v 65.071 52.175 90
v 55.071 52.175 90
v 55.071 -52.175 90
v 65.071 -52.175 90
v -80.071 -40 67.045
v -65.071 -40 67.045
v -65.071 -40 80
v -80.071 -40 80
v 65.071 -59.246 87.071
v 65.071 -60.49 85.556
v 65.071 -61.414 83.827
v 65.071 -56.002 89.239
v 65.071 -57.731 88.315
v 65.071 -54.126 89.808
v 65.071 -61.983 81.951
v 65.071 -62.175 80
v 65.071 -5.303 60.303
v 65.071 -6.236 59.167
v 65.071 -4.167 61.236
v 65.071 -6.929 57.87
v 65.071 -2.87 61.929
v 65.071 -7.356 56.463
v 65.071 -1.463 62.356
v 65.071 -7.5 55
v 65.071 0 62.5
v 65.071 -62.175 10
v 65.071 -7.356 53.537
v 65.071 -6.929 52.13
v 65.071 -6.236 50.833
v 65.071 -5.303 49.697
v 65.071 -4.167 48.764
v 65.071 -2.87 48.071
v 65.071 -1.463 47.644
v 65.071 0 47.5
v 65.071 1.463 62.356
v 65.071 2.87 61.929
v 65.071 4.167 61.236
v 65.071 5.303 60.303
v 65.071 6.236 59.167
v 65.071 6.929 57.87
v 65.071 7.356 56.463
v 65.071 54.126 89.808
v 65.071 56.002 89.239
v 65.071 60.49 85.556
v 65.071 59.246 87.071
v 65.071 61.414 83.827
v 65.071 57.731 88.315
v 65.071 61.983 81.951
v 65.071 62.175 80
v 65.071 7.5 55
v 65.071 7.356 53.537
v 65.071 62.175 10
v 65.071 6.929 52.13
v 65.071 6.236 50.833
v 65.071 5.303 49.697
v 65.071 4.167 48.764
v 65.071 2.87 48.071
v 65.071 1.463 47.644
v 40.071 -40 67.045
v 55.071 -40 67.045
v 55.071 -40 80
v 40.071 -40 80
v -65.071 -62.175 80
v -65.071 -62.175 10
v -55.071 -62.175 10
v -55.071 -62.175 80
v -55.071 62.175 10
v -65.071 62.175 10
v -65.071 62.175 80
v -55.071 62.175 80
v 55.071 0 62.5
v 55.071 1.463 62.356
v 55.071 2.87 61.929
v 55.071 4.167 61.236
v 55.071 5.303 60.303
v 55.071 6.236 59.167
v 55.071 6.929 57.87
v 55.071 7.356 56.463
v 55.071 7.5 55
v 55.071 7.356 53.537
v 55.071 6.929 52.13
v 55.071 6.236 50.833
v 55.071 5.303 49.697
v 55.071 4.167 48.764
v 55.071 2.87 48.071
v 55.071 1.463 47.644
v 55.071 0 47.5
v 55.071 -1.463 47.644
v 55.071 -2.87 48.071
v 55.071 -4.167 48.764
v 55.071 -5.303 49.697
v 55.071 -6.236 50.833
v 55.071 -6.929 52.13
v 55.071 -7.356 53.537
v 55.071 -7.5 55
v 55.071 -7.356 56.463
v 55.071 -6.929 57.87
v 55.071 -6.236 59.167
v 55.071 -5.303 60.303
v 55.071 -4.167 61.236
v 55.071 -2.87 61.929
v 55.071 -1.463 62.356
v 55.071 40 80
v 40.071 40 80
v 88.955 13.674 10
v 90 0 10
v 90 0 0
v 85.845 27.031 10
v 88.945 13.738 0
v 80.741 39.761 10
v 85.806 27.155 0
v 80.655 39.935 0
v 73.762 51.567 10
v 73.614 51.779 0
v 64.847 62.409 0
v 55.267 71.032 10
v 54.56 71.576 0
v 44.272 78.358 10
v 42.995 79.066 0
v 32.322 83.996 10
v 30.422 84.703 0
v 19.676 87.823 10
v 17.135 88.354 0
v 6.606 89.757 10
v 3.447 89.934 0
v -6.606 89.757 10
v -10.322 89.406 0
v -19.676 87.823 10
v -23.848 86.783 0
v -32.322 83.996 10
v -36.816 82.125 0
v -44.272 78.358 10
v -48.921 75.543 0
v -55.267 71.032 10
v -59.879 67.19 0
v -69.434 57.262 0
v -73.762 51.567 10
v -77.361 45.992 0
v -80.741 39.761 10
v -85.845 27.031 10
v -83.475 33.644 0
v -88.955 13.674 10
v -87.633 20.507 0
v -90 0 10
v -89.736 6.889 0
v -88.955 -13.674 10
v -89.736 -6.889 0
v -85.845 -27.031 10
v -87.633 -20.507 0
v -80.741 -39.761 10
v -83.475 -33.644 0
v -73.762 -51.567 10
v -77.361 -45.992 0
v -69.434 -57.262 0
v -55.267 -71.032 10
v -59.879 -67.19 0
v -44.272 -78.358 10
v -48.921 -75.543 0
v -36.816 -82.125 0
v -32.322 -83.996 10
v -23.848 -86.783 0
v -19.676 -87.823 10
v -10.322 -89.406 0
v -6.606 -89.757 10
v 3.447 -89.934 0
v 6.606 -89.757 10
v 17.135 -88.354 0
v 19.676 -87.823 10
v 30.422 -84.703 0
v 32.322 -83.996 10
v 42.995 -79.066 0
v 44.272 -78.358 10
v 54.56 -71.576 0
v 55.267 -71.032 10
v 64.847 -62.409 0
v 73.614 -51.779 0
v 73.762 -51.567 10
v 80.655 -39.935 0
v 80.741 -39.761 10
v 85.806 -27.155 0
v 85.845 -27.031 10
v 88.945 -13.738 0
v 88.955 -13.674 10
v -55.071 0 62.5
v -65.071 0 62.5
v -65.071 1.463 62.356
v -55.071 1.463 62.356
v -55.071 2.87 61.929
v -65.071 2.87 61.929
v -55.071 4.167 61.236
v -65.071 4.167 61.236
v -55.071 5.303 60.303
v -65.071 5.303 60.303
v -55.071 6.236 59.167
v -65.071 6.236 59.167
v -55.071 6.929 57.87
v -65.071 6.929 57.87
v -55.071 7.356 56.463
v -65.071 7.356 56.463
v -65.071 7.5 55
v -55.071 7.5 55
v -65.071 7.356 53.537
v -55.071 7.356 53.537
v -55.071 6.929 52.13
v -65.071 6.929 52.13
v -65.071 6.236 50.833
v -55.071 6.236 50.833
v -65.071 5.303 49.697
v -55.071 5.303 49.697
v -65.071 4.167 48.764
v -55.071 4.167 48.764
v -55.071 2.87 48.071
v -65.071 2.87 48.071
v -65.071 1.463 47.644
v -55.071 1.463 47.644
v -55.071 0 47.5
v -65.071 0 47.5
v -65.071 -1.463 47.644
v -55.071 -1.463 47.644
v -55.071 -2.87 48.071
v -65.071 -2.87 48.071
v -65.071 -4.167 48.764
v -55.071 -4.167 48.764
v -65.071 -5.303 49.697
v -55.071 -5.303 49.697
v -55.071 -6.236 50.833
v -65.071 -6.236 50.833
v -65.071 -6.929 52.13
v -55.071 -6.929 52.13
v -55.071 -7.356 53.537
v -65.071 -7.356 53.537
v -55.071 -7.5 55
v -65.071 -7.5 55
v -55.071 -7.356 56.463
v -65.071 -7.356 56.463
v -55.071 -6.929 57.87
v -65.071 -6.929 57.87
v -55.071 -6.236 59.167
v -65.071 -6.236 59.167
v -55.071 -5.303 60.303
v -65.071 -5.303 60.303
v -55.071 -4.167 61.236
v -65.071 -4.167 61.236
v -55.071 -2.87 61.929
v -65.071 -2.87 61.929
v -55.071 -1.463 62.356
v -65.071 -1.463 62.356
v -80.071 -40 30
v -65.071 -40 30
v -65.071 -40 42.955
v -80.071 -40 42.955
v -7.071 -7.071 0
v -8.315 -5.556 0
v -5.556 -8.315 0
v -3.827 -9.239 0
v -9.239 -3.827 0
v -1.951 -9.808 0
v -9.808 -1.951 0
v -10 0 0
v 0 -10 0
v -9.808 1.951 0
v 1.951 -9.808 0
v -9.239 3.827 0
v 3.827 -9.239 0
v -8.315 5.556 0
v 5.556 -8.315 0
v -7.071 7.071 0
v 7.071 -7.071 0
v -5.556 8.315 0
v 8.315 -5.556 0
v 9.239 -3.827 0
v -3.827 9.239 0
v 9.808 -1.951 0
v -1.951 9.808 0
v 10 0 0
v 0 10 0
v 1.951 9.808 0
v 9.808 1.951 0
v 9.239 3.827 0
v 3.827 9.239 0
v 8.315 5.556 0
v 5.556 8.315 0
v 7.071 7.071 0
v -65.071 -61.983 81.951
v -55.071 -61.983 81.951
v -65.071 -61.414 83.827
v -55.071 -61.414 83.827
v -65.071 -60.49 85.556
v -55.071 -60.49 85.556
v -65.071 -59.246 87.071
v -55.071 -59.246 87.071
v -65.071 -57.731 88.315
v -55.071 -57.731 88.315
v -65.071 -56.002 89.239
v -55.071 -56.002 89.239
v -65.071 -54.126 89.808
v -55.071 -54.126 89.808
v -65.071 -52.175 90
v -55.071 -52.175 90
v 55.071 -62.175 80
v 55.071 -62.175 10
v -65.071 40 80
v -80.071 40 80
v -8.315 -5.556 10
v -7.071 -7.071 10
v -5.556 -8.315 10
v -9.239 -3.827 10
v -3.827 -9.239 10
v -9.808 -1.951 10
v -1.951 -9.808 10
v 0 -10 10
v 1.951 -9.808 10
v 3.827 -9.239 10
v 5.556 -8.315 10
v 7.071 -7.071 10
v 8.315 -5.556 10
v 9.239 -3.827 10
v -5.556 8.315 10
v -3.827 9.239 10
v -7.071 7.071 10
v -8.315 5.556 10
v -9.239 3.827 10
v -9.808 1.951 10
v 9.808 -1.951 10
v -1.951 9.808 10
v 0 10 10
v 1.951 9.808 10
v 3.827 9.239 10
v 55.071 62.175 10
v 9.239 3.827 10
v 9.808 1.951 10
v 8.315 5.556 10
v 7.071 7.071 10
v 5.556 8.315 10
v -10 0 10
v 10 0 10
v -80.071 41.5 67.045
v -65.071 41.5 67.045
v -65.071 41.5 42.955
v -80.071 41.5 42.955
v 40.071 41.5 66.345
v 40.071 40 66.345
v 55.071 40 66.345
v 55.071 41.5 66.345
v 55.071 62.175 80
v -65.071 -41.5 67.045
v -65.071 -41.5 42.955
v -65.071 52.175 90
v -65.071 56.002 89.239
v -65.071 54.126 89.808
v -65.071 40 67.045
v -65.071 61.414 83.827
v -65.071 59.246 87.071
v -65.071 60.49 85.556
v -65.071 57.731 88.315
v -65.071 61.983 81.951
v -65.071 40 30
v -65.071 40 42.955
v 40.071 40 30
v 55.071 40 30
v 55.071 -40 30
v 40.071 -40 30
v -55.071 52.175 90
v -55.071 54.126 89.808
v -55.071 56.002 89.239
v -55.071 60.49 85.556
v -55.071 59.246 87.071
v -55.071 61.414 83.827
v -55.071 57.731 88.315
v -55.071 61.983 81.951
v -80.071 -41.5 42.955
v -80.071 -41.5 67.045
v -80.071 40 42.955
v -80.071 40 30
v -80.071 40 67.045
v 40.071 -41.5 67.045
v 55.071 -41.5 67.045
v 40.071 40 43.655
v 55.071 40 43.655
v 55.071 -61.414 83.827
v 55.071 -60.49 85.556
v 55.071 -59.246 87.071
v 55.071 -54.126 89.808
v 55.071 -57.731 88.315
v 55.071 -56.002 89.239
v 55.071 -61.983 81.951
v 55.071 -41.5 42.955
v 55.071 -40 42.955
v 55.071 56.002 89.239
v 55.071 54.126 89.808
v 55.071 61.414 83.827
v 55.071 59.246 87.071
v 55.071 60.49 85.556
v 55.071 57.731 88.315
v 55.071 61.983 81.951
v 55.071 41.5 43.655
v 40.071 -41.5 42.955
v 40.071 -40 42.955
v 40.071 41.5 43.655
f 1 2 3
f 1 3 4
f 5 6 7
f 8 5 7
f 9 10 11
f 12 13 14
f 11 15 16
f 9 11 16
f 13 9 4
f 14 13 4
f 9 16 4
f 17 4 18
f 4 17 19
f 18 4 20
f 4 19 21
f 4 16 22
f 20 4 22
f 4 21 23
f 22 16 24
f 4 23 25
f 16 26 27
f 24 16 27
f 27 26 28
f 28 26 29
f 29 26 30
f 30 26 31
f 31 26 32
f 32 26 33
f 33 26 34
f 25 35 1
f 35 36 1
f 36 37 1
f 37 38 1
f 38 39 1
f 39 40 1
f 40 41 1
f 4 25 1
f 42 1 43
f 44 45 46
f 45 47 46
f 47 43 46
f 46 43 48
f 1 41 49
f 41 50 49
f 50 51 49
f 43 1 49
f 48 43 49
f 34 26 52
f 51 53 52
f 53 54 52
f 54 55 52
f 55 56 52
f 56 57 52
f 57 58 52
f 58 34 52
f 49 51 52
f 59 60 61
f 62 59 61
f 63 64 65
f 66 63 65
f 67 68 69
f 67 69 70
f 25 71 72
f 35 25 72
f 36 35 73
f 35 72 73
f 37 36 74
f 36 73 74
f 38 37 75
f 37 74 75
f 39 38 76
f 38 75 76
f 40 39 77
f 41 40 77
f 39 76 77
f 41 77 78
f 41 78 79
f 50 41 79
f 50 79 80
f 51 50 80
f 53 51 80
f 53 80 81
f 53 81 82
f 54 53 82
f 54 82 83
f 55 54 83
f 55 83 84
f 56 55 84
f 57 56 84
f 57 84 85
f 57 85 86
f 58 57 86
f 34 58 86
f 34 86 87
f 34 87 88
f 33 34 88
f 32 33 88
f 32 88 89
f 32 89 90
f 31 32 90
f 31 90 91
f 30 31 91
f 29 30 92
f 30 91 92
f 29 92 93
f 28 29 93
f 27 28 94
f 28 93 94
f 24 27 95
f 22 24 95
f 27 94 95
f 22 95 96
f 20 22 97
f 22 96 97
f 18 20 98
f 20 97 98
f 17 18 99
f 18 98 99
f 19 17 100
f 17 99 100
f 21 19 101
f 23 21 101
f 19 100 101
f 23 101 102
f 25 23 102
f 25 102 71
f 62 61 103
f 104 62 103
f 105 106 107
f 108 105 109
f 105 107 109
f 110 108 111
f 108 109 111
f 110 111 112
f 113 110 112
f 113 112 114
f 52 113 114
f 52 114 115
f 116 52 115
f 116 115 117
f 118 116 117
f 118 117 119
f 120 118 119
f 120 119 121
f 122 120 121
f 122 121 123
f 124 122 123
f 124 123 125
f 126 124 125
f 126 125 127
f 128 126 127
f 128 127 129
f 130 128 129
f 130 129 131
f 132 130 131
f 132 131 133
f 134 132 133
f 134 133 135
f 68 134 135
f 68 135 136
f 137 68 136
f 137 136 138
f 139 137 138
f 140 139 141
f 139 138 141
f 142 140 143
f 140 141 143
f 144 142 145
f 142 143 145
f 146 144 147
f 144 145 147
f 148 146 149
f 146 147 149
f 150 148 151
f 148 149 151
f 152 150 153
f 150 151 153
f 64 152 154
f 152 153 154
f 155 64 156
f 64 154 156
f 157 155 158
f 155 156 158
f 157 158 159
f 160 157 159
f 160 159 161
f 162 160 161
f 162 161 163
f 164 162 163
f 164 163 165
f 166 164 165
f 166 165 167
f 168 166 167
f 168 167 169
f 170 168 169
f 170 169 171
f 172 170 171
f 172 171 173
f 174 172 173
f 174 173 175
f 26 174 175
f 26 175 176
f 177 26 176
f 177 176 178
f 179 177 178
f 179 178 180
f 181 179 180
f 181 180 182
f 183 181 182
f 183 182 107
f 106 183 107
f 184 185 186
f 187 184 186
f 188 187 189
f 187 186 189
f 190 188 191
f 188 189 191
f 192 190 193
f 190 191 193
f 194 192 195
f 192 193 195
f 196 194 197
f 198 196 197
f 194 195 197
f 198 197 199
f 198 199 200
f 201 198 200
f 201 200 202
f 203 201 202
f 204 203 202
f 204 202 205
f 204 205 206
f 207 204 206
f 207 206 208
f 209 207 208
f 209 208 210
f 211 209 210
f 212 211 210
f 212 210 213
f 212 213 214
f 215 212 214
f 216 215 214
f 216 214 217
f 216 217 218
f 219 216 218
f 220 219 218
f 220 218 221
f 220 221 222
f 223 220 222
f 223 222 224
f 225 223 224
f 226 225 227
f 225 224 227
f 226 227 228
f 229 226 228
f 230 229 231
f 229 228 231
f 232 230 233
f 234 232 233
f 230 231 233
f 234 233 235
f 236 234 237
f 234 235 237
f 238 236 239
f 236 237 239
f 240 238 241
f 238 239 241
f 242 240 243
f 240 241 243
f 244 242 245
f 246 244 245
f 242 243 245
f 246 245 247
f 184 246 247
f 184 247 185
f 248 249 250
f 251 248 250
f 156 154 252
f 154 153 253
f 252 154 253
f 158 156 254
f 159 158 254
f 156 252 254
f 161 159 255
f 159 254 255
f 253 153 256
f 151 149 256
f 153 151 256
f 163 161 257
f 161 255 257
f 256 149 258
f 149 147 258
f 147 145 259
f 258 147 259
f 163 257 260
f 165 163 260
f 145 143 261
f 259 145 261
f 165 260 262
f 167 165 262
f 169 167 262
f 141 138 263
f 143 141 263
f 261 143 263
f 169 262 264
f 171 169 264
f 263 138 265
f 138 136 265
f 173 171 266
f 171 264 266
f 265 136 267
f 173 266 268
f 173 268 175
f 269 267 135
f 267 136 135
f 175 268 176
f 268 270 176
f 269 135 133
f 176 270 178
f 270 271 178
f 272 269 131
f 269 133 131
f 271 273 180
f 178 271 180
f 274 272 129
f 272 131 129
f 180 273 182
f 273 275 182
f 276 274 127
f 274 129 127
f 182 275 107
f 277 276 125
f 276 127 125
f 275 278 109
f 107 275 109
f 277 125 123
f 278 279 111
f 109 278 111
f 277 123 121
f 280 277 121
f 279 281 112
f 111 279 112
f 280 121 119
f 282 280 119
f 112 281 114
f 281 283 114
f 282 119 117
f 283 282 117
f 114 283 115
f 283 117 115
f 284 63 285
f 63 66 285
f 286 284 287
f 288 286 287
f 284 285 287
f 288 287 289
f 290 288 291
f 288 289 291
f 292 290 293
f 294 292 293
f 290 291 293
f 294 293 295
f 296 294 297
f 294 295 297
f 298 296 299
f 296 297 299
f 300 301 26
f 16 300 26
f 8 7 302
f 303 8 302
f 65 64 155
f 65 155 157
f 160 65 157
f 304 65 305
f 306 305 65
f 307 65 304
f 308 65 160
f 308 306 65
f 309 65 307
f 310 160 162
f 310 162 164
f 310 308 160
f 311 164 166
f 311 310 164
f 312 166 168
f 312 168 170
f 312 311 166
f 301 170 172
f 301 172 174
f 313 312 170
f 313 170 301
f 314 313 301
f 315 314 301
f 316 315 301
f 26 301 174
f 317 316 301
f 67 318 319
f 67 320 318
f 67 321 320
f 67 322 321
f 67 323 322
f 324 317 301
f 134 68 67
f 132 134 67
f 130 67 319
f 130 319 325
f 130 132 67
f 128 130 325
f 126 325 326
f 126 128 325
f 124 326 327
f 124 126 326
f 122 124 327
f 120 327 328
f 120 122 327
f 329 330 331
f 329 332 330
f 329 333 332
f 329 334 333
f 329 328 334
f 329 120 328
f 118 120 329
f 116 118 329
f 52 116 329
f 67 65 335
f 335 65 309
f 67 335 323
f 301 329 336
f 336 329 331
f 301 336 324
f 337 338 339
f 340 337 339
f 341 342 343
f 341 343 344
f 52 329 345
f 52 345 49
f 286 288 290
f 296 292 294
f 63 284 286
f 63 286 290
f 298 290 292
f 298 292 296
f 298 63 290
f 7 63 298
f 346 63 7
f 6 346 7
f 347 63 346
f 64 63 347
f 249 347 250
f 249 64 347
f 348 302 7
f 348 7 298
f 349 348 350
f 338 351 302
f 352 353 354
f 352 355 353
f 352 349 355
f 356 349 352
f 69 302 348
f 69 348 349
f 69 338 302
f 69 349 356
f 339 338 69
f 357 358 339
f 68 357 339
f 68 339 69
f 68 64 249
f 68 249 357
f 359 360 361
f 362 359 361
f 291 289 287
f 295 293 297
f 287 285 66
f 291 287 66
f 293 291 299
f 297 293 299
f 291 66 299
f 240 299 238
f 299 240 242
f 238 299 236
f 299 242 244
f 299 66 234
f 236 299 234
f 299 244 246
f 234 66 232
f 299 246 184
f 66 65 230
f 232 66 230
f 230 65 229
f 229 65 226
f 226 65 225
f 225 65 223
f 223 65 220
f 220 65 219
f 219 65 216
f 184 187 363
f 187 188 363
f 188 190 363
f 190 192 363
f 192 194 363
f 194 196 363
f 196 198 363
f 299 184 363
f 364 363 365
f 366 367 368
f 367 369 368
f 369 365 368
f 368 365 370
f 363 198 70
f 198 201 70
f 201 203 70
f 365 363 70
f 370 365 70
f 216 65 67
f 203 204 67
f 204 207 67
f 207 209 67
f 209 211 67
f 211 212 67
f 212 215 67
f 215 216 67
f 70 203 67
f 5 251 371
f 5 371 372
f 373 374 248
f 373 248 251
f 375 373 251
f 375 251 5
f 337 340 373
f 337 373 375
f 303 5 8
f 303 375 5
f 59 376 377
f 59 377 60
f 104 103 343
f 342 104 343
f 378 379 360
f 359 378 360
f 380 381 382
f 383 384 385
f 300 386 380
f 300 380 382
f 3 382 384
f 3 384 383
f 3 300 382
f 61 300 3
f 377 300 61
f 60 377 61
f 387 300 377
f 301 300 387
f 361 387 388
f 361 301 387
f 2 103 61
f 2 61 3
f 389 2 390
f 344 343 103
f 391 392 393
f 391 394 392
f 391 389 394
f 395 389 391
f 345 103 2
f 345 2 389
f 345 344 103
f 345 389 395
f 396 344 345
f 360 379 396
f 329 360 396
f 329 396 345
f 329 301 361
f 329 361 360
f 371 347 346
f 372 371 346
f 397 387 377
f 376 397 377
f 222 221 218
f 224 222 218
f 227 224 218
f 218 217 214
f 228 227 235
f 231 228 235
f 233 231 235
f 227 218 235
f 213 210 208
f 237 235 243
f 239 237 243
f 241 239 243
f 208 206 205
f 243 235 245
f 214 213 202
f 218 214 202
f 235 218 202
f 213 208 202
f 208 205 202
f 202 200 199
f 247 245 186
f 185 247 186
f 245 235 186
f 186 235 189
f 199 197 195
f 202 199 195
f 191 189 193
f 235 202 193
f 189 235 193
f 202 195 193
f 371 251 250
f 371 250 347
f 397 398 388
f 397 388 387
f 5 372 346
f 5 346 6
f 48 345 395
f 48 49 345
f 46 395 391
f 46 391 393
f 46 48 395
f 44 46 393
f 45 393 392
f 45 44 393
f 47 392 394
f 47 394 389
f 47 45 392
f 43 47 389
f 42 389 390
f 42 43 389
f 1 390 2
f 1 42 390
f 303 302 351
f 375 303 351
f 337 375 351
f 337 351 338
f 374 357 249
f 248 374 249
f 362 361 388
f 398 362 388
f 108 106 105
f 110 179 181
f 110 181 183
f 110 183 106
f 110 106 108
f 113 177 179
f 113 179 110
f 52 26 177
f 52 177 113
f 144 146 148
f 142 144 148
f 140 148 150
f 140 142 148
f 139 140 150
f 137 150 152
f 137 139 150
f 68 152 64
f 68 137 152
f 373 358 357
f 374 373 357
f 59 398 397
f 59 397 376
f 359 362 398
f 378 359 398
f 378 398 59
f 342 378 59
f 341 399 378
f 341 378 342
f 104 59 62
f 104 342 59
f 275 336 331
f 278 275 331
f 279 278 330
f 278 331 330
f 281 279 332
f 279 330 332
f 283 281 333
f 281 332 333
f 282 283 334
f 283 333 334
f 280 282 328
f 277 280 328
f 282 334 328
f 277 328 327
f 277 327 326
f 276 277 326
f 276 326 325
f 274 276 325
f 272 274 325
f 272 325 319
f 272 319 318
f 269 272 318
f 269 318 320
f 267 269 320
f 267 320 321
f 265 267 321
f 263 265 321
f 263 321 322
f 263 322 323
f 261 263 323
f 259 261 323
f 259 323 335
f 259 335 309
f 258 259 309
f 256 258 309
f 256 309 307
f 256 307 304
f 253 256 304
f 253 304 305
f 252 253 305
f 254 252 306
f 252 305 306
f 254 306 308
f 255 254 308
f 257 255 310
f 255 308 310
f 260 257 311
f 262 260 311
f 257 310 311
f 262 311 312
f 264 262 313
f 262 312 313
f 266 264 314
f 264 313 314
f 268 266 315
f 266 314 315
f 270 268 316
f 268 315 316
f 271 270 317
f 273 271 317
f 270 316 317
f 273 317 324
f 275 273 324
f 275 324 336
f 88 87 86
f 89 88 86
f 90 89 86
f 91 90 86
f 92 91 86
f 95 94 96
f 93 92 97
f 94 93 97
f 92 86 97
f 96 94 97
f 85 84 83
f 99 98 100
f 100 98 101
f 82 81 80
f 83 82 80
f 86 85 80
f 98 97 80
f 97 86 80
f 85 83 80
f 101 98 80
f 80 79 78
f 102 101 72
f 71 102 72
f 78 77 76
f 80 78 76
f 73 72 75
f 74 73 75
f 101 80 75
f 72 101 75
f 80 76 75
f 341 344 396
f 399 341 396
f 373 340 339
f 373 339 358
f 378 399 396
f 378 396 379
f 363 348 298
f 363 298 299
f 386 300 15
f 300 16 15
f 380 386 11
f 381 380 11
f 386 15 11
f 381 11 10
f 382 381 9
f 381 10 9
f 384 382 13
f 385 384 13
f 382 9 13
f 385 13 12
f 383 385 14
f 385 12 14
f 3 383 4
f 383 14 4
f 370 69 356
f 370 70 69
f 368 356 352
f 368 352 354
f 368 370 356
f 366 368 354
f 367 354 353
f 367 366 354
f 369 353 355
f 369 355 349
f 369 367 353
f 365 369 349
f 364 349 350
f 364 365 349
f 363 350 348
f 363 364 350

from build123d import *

# Parameters (mm, degrees)
SKETCH1_R           = 90
BOSS_EXTRUDE1_DEPTH = 10
SKETCH2_W           = 10
SKETCH2_H           = 124.350526514
BOSS_EXTRUDE2_DEPTH = 80
FILLET1_R           = 10
SKETCH3_R           = 7.5
CUT_EXTRUDE1_DEPTH  = 201.616596644
SKETCH4_R           = 10
CUT_EXTRUDE2_DEPTH  = 30
BOSS_EXTRUDE5_DEPTH = 15
BOSS_EXTRUDE6_DEPTH = 15


with BuildPart() as part:
    # Sketch1 → Boss-Extrude1 (new body)
    with BuildSketch(Plane.XY):
        Circle(SKETCH1_R)
    extrude(amount=BOSS_EXTRUDE1_DEPTH)

    # Sketch2 → Boss-Extrude2 (add)
    with BuildSketch(Plane.XY.offset(10)):
        with Locations((-60.071012279, 0)):
            Rectangle(SKETCH2_W, SKETCH2_H)
        with Locations((60.071012279, 0)):
            Rectangle(SKETCH2_W, SKETCH2_H)
    extrude(amount=BOSS_EXTRUDE2_DEPTH)

    # Fillet1
    fillet1_edges = [part.edges().sort_by_distance(p)[0] for p in [
        (60.071012279, 62.175263257, 90),
        (60.071012279, -62.175263257, 90),
        (-60.071012279, 62.175263257, 90),
        (-60.071012279, -62.175263257, 90),
    ]]
    fillet(fillet1_edges, radius=FILLET1_R)

    # Sketch3 → Cut-Extrude1 (cut, through all)
    with BuildSketch(Plane.ZY.offset(65.071012279)):
        with Locations((55, 0)):
            Circle(SKETCH3_R)
    extrude(amount=-CUT_EXTRUDE1_DEPTH, mode=Mode.SUBTRACT)

    # Sketch4 → Cut-Extrude2 (cut)
    with BuildSketch(Plane.XY.offset(10)):
        Circle(SKETCH4_R)
    extrude(amount=-CUT_EXTRUDE2_DEPTH, mode=Mode.SUBTRACT)

    # Sketch7 → Boss-Extrude5 (add)
    with BuildSketch(Plane.ZY.offset(65.071012279)):
        Polygon((30, 40), (30, -40), (42.954861641, -40), (42.954861641, -41.5), (67.045138359, -41.5), (67.045138359, -40), (80, -40), (80, 40), (67.045138359, 40), (67.045138359, 41.5), (42.954861641, 41.5), (42.954861641, 40), align=None)
    extrude(amount=BOSS_EXTRUDE5_DEPTH)

    # Sketch8 → Boss-Extrude6 (add)
    with BuildSketch(Plane.ZY.offset(-55.071012279)):
        Polygon((30, 40), (30, -40), (42.954861641, -40), (42.954861641, -41.5), (67.045138359, -41.5), (67.045138359, -40), (80, -40), (80, 40), (66.344670443, 40), (66.344670443, 41.5), (43.655329557, 41.5), (43.655329557, 40), align=None)
    extrude(amount=BOSS_EXTRUDE6_DEPTH)


solid = part.part
